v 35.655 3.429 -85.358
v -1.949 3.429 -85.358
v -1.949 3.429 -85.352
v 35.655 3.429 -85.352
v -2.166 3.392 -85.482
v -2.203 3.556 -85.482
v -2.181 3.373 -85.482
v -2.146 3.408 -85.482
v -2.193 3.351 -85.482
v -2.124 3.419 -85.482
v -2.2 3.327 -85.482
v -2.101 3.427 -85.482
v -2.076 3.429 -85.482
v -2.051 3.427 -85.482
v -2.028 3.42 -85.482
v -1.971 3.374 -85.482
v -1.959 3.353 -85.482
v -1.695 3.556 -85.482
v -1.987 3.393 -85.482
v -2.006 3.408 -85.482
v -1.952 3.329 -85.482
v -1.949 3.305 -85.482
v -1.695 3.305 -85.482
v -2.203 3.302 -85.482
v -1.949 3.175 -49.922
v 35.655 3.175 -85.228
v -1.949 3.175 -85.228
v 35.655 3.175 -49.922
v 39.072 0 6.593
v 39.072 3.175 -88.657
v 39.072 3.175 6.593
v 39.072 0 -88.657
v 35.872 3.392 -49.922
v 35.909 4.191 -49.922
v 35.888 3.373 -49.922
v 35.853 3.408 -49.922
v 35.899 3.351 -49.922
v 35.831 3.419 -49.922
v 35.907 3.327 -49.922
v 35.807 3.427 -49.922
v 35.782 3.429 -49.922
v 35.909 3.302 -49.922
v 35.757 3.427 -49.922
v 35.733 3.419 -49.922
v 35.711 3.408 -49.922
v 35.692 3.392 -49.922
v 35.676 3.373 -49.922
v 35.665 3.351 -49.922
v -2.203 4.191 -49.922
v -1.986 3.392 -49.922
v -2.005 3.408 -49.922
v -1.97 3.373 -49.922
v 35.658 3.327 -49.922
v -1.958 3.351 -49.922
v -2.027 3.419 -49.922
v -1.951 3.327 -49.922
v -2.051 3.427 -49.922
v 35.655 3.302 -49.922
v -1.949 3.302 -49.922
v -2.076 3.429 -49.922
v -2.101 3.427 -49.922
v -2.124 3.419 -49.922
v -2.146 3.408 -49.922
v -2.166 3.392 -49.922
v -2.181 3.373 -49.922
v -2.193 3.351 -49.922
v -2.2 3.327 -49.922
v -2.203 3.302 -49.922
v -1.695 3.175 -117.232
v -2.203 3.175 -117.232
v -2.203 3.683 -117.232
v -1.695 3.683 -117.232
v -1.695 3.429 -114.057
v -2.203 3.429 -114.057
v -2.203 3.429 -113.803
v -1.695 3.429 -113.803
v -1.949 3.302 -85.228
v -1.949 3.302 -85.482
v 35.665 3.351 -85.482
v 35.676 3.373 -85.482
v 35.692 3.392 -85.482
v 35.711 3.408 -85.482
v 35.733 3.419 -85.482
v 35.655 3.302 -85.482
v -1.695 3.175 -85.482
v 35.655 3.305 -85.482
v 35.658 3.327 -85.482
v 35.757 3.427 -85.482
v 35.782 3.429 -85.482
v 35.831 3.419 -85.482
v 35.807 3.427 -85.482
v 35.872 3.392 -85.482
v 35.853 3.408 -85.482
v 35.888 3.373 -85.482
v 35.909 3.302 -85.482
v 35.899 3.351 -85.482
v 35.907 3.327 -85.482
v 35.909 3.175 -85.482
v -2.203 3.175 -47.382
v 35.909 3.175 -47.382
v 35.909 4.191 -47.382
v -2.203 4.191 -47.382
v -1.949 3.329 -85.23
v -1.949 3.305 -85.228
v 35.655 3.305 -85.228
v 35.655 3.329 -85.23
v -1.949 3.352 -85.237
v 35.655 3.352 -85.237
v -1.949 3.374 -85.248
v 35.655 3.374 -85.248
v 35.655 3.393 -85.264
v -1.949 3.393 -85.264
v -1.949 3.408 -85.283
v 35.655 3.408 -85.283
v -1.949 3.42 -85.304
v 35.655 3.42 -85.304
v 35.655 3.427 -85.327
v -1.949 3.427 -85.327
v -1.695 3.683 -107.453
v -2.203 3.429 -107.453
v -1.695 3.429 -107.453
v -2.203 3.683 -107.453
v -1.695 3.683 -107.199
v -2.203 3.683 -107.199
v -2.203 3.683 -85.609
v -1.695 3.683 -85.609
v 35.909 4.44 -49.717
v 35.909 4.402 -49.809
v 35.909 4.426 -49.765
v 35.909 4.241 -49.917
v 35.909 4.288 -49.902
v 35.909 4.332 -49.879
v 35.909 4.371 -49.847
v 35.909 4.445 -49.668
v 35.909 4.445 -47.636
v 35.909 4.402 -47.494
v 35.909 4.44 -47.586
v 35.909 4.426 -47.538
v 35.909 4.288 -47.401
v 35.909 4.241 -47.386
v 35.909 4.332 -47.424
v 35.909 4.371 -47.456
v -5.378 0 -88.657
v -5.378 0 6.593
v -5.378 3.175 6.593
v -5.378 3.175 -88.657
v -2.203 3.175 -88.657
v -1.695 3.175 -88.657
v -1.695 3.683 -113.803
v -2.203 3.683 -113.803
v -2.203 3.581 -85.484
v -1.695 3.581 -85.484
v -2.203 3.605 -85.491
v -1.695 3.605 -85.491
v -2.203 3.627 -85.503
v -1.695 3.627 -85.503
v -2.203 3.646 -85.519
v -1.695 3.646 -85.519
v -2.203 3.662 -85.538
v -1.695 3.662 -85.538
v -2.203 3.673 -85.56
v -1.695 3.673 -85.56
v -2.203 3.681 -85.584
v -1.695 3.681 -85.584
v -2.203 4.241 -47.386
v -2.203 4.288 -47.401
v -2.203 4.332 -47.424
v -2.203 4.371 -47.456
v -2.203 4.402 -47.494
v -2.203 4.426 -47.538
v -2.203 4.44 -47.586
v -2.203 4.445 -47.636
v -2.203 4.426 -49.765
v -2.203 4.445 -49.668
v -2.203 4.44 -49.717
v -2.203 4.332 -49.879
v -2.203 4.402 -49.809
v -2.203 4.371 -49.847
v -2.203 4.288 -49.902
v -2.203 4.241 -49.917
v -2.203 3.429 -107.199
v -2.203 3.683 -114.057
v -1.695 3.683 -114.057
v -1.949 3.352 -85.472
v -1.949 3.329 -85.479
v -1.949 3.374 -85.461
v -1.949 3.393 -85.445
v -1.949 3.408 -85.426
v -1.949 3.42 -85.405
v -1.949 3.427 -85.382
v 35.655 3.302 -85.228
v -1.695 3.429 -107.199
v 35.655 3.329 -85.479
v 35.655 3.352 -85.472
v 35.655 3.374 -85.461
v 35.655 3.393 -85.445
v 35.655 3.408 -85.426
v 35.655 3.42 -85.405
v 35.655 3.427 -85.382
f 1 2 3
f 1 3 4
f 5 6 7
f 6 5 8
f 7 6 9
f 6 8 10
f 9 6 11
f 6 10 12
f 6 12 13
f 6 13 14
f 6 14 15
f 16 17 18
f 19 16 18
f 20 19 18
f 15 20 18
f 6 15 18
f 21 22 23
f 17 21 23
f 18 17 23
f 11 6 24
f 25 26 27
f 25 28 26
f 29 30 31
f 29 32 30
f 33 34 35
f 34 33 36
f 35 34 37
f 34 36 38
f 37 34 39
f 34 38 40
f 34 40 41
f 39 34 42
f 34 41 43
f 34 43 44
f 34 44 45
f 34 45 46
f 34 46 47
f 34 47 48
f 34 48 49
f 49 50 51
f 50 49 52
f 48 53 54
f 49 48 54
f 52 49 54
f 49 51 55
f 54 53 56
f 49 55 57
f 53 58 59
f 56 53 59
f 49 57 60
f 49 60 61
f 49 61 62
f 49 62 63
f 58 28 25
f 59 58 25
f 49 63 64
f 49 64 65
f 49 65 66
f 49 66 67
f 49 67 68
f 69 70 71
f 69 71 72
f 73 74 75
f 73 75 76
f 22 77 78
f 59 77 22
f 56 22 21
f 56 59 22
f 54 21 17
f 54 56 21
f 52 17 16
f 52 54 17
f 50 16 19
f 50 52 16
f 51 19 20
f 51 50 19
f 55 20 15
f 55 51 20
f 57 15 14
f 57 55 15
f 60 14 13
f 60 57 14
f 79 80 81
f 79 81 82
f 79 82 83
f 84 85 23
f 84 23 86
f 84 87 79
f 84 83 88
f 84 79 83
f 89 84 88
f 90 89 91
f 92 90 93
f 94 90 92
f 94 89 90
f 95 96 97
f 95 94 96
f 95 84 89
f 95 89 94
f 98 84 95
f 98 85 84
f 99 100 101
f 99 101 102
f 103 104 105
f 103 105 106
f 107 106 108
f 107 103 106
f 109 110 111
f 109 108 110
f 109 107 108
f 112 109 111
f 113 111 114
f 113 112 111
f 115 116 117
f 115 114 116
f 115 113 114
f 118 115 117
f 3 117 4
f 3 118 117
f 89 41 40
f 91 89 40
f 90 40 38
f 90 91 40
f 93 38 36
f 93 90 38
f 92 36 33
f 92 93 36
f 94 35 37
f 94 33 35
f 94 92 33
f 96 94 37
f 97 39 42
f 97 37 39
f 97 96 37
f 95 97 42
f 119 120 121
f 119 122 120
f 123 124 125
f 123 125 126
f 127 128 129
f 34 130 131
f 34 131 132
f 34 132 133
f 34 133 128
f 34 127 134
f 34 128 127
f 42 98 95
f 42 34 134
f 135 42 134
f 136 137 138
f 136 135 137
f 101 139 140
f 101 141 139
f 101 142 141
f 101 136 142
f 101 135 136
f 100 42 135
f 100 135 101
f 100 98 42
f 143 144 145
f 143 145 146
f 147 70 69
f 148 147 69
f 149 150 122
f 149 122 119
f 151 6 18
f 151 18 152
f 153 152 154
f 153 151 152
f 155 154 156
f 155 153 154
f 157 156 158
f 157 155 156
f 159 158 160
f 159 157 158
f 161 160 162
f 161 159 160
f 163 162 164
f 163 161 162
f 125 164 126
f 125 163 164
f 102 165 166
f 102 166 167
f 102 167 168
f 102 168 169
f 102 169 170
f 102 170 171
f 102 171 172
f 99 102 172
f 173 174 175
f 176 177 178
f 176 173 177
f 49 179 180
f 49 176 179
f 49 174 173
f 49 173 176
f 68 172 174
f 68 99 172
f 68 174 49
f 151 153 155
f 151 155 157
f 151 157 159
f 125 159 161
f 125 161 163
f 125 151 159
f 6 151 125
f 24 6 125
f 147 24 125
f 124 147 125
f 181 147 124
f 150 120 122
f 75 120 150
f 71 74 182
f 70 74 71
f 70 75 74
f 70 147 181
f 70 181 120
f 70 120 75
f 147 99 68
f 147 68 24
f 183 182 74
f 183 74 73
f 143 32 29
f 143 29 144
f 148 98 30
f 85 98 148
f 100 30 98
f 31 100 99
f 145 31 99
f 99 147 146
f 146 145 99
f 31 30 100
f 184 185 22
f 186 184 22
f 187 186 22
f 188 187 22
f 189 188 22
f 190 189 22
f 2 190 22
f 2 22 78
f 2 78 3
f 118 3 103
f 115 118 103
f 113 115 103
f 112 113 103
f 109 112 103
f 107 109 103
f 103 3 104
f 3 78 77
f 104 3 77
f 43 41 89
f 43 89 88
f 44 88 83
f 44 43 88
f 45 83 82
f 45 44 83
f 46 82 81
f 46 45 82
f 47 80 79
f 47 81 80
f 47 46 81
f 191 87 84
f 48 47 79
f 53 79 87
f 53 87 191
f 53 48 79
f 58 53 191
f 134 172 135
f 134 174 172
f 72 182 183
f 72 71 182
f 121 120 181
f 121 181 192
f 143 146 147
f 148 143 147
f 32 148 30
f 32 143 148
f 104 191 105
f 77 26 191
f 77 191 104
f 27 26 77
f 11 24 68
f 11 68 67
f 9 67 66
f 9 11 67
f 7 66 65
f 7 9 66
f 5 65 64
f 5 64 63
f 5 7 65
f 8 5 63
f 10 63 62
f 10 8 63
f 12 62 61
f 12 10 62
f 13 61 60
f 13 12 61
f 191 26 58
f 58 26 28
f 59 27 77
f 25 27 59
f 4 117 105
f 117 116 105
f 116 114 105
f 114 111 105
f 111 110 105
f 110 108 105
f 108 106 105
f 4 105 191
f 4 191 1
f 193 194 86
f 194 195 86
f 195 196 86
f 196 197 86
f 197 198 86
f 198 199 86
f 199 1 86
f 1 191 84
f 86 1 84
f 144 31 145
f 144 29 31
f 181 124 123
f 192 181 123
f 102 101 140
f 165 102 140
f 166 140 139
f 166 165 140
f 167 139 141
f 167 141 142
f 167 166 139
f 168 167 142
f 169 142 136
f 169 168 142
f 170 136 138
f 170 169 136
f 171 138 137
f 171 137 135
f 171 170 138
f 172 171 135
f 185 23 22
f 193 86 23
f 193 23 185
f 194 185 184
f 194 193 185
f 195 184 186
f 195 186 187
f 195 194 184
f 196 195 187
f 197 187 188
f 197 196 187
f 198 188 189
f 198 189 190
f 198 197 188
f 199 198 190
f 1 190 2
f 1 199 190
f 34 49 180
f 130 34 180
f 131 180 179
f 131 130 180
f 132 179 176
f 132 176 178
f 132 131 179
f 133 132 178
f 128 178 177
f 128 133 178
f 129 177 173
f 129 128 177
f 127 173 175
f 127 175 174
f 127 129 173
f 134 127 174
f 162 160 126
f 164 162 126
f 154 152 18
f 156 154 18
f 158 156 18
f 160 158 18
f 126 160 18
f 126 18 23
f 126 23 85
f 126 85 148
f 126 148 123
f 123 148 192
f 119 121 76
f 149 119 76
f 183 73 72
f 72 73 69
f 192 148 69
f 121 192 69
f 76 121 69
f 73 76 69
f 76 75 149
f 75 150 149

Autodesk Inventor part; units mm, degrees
ref_plane "YZ Plane" through (0, 0, 0) normal (1, 0, 0) x (0, 1, 0)
ref_plane "XZ Plane" through (0, 0, 0) normal (0, 1, 0) x (-1, 0, 0)
ref_plane "XY Plane" through (0, 0, 0) normal (0, 0, 1) x (1, 0, 0)
sketch "Sketch1" plane through (0, 0, 0) normal (0, 1, 0) x (-1, 0, 0)
  line L0 (5.3777, 6.5934) -> (5.3777, -88.6566)
  line L1 (5.3777, -88.6566) -> (-39.0723, -88.6566)
  line L2 (-39.0723, -88.6566) -> (-39.0723, 6.5934)
  line L3 (-39.0723, 6.5934) -> (5.3777, 6.5934)
  point P0 (0, 0)
  dimension "d0" = 95.25
  dimension "d1" = 44.45
extrude "Extrusion1" add sketch "Sketch1" along normal blind 3.175
sketch "Sketch2" plane through (0, 3.175, 0) normal (0, 1, 0) x (1, 0, 0)
  line L0 (39.0723, 88.6566) -> (-5.3777, 88.6566) projected
  line L1 (-5.3777, 88.6566) -> (-2.2027, 88.6566)
  line L2 (-2.2027, 88.6566) -> (-2.2027, 85.4816)
  line L3 (-2.2027, 85.4816) -> (-1.9487, 85.4816)
  line L4 (-1.9487, 85.4816) -> (-1.9487, 49.9216)
  line L5 (-1.9487, 49.9216) -> (-2.2027, 49.9216)
  line L6 (-2.2027, 49.9216) -> (-2.2027, 85.4816)
  point P0 (0, 0)
  dimension "d4" = 3.175
  dimension "d5" = 3.175
  dimension "d6" = 0.254
  dimension "d7" = 35.56
  dimension "d8" = 35.56
extrude "Extrusion2" add sketch "Sketch2" along normal blind 0.254
fillet "Fillet1" radius 0.127 2 edges at (-1.9487, 3.429, -67.7016) (-2.2027, 3.429, -67.7016)
sketch "Sketch3" plane through (0, 3.175, 0) normal (0, 1, 0) x (1, 0, 0)
  line L0 (39.0723, -6.5934) -> (39.0723, 88.6566) projected
  line L1 (39.0723, 88.6566) -> (35.9091, 88.6566)
  line L2 (39.0723, 88.6566) -> (-5.3777, 88.6566) projected
  line L3 (35.9091, 88.6566) -> (35.9091, 85.4816)
  line L4 (35.9091, 85.4816) -> (35.6551, 85.4816)
  line L5 (35.6551, 85.4816) -> (35.6551, 49.9216)
  line L6 (35.6551, 49.9216) -> (35.9091, 49.9216)
  line L7 (35.9091, 49.9216) -> (35.9091, 85.4816)
  point P0 (0, 0)
  dimension "d12" = 3.175
  dimension "d13" = 0.254
  dimension "d14" = 35.56
  dimension "d15" = 0.254
  dimension "d16" = 35.56
extrude "Extrusion3" add sketch "Sketch3" along normal blind 0.254
fillet "Fillet2" radius 0.127 2 edges at (35.9091, 3.429, -67.7016) (35.6551, 3.429, -67.7016)
sketch "Sketch4" plane through (0, 3.175, 0) normal (0, 1, 0) x (1, 0, 0)
  line L0 (-1.9487, 85.4816) -> (-1.9487, 49.9216) projected
  line L1 (35.6551, 49.9216) -> (35.6551, 85.4816) projected
  line L2 (-1.9487, 85.4816) -> (35.6551, 85.4816)
  line L3 (35.6551, 85.4816) -> (35.6551, 85.2276)
  line L4 (35.6551, 85.2276) -> (-1.9487, 85.2276)
  line L5 (-1.9487, 85.2276) -> (-1.9487, 85.4816)
  point P0 (0, 0)
  dimension "d20" = 0.254
extrude "Extrusion4" add sketch "Sketch4" along normal blind 0.254
fillet "Fillet3" radius 0.127 2 edges at (16.8532, 3.429, -85.2276) (16.8532, 3.429, -85.4816)
sketch "Sketch5" plane through (-2.2027, 3.175, -85.4816) normal (-1, 0, 0) x (0, 0, 1)
  point P0 (85.4816, -3.175)
sketch "Sketch6" plane through (0, 3.175, 0) normal (0, 1, 0) x (1, 0, 0)
  line L0 (-2.2027, 85.4816) -> (-1.9487, 85.4816) projected
  line L1 (-2.2027, 85.4816) -> (-2.4567, 85.4816)
  line L2 (35.6551, 85.4816) -> (-1.9487, 85.4816) projected
  line L3 (-1.9487, 85.4816) -> (-1.6947, 85.4816)
  line L4 (-1.6947, 85.4816) -> (-1.6947, 117.2316)
  line L5 (-2.2027, 85.4816) -> (-2.2027, 117.2316)
  line L6 (-2.2027, 117.2316) -> (-1.6947, 117.2316)
  point P0 (0, 0)
  dimension "d24" = 0.254
  dimension "d25" = 0.254
  dimension "d26" = 31.75
extrude "Extrusion5" add sketch "Sketch6" along normal blind 0.508
fillet "Fillet4" radius 0.127 1 edges at (-1.9487, 3.683, -85.4816)
sketch "Sketch7" plane through (0, 3.683, 0) normal (0, 1, 0) x (1, 0, 0)
  line L0 (-2.2027, 117.2316) -> (-2.2027, 88.6566) projected
  line L1 (-2.2027, 117.2316) -> (-2.2027, 114.0566)
  line L2 (-2.2027, 114.0566) -> (-1.6947, 114.0566)
  line L3 (-1.6947, 85.6086) -> (-1.6947, 117.2316) projected
  line L4 (-2.2027, 114.0566) -> (-2.2027, 113.8026)
  line L5 (-2.2027, 113.8026) -> (-1.6947, 113.8026)
  line L6 (-1.6947, 113.8026) -> (-1.6947, 114.0566)
  point P0 (0, 0)
  dimension "d30" = 3.175
  dimension "d31" = 0.254
extrude "Extrusion6" cut sketch "Sketch7" against normal blind 0.254
sketch "Sketch8" plane through (0, 3.683, 0) normal (0, 1, 0) x (1, 0, 0)
  line L0 (-1.6947, 113.8026) -> (-2.2027, 113.8026) projected
  line L1 (-2.2027, 113.8026) -> (-2.2027, 107.4526)
  line L2 (-2.2027, 117.2316) -> (-2.2027, 88.6566) projected
  line L3 (-2.2027, 107.4526) -> (-1.6947, 107.4526)
  line L4 (-1.6947, 88.6566) -> (-1.6947, 117.2316) projected
  line L5 (-2.2027, 107.4526) -> (-2.2027, 107.1986)
  line L6 (-2.2027, 107.1986) -> (-1.6947, 107.1986)
  line L7 (-1.6947, 107.4526) -> (-1.6947, 107.1986)
  line L8 (-2.2027, 107.4526) -> (-1.6947, 107.4526)
  line L9 (-1.6947, 107.1986) -> (-1.6947, 107.4526)
  line L10 (-2.2027, 107.4526) -> (-2.2027, 107.1986)
  line L11 (-2.2027, 107.1986) -> (-1.6947, 107.1986)
  point P0 (0, 0)
  dimension "d34" = 6.35
  dimension "d35" = 0.254
extrude "Extrusion7" cut sketch "Sketch8" against normal blind 0.254 contours L4 L6 L2 L3
sketch "Sketch9" plane through (0, 3.175, 0) normal (0, 1, 0) x (1, 0, 0)
  line L0 (-2.2027, 85.4816) -> (-2.2027, 49.9216) projected
  line L1 (35.9091, 49.9216) -> (35.6551, 49.9216) projected
  line L2 (-2.2027, 49.9216) -> (35.9091, 49.9216)
  line L3 (35.9091, 49.9216) -> (35.9091, 47.3816)
  line L4 (35.9091, 47.3816) -> (-2.2027, 47.3816)
  line L5 (-2.2027, 47.3816) -> (-2.2027, 49.9216)
  point P0 (0, 0)
  dimension "d38" = 2.54
extrude "Extrusion8" add sketch "Sketch9" along normal blind 1.27
fillet "Fillet5" radius 0.254 2 edges at (16.8532, 4.445, -47.3816) (16.8532, 4.445, -49.9216)
properties part number "mousetrap"
